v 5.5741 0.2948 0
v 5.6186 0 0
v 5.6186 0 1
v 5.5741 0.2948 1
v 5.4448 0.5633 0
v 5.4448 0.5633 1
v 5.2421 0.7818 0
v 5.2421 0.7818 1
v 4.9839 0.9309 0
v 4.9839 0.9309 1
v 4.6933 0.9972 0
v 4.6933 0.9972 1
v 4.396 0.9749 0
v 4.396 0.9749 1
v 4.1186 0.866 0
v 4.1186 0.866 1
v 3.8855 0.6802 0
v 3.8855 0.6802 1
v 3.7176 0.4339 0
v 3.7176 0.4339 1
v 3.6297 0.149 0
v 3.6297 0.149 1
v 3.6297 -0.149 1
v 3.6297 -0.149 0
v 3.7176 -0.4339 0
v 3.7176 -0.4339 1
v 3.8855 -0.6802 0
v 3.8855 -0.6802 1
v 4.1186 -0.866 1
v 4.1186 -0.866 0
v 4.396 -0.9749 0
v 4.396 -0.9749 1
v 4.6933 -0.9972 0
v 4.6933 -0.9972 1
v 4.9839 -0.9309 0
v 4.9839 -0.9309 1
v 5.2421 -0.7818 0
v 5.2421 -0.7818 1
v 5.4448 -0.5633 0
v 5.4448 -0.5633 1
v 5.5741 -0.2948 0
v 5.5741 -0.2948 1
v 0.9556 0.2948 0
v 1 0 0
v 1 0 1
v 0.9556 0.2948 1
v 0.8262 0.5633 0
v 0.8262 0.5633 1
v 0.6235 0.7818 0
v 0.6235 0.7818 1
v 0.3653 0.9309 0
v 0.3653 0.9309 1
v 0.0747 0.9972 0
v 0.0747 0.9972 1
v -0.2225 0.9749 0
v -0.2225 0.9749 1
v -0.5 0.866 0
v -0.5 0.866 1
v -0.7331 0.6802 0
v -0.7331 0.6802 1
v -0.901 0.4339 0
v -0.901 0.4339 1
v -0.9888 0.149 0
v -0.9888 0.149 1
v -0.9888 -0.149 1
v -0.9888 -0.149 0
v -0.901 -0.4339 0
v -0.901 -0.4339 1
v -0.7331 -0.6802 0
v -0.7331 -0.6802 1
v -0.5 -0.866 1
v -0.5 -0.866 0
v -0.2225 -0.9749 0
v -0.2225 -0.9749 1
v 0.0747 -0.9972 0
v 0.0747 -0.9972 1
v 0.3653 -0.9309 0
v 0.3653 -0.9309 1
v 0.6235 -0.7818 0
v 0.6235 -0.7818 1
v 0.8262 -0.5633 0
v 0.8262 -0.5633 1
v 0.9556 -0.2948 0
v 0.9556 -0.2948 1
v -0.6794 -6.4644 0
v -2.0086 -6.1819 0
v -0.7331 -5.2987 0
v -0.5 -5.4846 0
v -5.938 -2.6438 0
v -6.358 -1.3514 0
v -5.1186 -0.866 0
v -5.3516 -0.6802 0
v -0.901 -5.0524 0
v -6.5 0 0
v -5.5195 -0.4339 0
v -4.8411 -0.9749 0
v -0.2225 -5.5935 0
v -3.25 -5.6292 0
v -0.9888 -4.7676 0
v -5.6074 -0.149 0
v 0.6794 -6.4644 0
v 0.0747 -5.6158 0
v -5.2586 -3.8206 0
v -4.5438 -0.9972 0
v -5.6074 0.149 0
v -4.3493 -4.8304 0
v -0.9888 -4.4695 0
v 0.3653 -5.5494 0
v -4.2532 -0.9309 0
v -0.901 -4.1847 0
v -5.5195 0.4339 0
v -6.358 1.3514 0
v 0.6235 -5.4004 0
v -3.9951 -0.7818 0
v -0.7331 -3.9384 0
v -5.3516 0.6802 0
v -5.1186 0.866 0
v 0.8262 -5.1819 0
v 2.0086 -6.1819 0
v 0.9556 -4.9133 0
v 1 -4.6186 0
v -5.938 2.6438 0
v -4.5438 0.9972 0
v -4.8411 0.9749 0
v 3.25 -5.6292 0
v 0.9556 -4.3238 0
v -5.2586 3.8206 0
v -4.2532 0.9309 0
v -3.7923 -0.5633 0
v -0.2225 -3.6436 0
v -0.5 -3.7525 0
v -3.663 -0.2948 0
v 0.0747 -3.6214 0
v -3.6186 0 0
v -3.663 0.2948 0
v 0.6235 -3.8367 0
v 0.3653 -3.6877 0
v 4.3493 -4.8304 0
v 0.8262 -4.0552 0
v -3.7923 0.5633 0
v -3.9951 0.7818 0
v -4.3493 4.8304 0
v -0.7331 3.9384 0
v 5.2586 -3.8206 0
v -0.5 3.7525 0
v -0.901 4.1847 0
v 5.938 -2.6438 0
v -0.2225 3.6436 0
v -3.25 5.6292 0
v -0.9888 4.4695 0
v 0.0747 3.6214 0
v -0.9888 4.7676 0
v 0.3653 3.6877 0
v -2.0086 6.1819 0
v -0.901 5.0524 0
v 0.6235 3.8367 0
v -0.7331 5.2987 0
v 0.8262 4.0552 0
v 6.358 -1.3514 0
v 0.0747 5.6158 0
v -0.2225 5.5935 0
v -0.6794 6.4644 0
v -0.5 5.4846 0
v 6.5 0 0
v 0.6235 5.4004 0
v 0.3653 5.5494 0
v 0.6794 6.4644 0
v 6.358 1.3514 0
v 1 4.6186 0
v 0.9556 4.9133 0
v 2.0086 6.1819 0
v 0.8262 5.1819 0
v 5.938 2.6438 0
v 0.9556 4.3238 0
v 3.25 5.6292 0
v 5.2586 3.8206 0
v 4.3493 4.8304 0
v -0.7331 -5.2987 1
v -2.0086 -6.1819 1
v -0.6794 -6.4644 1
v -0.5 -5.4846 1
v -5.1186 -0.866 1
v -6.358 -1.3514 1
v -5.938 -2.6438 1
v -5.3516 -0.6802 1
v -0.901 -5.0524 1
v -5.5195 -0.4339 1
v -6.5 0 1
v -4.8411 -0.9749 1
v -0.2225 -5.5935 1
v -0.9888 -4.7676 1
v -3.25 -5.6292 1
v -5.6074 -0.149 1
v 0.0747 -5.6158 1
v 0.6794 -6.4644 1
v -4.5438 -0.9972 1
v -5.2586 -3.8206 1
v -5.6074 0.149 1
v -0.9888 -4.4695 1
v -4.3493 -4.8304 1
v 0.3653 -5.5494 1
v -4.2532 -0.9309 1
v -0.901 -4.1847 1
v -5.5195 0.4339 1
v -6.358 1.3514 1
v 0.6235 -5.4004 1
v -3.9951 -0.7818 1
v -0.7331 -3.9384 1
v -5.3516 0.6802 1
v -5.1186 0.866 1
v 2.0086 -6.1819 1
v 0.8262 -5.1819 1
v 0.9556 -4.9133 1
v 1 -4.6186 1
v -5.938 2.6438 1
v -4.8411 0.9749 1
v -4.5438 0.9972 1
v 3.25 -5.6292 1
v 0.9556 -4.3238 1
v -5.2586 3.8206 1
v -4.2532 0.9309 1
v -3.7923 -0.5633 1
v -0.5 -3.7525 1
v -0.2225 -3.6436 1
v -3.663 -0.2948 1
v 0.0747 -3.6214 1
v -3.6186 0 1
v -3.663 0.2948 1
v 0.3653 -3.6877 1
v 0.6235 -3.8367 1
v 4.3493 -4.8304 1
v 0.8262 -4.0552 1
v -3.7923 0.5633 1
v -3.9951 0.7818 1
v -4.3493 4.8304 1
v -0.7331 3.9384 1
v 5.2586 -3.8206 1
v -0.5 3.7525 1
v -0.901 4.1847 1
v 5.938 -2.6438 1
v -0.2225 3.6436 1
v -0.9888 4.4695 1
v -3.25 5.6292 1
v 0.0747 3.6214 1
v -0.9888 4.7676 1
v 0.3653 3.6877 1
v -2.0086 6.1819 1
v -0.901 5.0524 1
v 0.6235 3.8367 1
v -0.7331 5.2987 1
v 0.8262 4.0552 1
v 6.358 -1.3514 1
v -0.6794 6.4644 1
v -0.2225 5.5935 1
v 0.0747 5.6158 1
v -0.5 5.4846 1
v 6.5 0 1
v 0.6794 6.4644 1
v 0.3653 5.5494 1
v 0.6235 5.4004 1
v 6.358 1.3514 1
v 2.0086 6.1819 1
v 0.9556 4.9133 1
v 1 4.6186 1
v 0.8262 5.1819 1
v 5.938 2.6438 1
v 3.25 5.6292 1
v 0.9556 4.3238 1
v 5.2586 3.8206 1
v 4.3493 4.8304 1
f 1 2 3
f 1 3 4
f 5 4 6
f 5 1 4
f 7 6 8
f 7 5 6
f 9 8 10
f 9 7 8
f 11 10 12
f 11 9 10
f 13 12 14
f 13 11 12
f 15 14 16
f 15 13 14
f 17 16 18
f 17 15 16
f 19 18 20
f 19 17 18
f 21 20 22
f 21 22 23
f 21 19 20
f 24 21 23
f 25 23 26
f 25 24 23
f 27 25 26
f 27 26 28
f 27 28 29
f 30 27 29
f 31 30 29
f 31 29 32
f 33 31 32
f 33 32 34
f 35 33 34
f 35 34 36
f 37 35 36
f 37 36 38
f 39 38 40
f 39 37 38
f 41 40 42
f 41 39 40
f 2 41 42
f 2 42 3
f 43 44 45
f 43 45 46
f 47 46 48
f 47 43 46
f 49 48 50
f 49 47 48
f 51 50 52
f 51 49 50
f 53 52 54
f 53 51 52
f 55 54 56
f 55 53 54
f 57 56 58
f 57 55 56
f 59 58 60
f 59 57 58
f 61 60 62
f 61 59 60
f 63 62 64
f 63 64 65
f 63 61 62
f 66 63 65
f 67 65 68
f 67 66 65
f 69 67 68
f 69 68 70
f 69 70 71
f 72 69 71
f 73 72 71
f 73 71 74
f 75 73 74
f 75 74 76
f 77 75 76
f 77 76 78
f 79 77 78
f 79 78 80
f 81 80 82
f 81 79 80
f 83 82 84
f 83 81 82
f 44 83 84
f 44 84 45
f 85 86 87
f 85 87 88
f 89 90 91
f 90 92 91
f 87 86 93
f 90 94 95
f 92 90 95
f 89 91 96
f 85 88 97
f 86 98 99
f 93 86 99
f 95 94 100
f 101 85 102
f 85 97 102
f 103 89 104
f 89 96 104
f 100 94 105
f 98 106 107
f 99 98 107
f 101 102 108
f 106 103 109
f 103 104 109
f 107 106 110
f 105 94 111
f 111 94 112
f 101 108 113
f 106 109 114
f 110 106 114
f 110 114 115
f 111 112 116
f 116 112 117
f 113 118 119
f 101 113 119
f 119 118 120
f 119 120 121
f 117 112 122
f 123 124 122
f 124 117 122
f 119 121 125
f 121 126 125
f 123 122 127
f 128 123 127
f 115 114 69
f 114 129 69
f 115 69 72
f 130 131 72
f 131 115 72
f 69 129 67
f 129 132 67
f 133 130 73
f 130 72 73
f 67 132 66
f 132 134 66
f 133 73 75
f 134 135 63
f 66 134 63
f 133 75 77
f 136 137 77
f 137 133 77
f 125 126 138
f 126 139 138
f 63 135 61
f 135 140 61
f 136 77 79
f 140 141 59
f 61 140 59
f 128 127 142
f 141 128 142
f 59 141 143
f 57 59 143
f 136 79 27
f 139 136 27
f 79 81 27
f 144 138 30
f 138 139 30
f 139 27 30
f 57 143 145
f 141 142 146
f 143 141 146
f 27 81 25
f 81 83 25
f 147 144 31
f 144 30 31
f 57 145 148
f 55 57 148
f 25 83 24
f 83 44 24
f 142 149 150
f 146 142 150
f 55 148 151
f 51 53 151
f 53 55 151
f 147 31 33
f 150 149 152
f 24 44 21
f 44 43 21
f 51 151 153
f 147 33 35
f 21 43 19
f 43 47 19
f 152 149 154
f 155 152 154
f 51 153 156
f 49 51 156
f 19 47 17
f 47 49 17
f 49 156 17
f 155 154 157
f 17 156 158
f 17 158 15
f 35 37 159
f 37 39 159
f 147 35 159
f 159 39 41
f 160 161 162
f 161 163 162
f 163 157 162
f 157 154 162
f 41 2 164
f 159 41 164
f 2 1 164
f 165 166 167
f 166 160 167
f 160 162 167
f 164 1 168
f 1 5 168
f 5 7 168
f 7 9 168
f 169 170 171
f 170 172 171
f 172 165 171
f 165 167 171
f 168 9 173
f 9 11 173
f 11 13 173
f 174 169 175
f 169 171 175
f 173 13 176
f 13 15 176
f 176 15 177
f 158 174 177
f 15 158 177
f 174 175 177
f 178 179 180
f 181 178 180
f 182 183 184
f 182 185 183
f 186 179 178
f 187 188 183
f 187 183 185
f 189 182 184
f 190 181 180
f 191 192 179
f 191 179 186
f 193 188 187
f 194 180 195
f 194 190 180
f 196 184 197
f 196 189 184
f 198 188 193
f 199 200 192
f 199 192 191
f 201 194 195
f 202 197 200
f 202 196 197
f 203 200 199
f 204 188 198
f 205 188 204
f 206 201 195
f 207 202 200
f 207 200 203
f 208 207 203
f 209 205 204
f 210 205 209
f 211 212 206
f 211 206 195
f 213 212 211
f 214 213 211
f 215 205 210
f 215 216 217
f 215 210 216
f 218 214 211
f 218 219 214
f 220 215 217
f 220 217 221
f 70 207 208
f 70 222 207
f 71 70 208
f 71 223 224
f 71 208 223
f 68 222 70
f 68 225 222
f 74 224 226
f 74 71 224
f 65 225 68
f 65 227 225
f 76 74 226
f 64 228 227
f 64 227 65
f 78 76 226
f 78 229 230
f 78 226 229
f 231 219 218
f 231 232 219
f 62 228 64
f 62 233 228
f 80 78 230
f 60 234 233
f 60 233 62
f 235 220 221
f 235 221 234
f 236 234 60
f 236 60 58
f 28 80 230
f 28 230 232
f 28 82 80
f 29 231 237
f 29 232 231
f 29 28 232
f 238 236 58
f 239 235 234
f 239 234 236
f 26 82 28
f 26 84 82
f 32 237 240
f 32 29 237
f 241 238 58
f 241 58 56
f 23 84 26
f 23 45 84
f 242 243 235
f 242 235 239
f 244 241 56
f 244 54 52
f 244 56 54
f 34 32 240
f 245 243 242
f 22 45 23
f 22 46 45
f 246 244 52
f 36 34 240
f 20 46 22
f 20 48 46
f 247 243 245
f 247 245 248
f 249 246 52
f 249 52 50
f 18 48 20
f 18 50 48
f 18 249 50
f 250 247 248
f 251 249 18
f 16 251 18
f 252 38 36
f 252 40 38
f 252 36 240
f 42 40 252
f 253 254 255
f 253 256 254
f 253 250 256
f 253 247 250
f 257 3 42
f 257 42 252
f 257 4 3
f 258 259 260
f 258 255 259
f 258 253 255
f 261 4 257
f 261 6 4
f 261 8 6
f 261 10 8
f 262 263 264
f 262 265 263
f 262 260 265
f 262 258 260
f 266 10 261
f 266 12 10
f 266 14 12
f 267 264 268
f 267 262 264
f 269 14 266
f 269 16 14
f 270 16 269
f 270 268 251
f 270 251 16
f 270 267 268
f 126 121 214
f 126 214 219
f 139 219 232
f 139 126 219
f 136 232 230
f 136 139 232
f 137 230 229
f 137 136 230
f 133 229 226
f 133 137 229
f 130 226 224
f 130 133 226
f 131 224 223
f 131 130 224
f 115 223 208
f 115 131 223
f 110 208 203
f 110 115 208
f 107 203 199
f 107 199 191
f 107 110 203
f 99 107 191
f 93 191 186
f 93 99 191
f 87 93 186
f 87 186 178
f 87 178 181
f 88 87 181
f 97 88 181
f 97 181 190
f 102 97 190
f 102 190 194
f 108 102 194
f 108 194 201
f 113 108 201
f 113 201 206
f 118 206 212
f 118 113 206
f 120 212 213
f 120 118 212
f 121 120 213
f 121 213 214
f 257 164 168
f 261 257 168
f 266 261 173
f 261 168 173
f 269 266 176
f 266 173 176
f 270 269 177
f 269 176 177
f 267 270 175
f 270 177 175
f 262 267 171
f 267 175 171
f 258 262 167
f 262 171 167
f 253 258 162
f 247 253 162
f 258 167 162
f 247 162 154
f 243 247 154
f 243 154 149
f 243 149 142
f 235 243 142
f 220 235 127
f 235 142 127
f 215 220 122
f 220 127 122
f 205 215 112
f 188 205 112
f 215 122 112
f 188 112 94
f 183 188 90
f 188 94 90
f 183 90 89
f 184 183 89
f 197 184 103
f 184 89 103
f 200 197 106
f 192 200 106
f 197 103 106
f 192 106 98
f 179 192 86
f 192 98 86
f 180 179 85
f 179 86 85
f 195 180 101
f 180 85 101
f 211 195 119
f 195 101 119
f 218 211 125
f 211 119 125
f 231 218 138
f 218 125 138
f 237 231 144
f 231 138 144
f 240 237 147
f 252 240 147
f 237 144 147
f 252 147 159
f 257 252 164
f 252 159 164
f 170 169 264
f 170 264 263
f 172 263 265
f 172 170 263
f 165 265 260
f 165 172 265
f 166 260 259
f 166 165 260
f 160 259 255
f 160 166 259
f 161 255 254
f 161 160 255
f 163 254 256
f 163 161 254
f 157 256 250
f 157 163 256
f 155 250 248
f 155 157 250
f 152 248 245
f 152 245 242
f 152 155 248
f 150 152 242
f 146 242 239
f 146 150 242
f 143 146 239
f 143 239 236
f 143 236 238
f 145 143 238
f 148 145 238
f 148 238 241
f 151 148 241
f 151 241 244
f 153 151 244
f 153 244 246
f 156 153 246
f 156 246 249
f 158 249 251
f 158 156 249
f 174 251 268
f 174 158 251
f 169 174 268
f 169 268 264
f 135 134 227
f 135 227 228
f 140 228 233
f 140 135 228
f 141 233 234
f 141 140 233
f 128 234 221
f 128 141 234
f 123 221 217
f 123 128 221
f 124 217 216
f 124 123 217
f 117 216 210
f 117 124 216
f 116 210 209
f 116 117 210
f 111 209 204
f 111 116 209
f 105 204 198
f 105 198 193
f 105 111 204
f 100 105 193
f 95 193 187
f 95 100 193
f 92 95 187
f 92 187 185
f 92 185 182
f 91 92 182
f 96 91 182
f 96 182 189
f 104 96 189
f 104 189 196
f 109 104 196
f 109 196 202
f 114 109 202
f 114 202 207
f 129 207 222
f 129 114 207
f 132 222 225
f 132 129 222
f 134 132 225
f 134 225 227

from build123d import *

# Parameters (mm, degrees)
F0_R     = 6.5
F0_R_2   = 1
F1_DEPTH = 1


with BuildPart() as f1:
    # F0 (on Top) → F1 (new body)
    with BuildSketch(Plane.XY):
        Circle(F0_R)
        with Locations((0, -4.618563)):
            Circle(F0_R_2, mode=Mode.SUBTRACT)
        with Locations((-4.618563, 0)):
            Circle(F0_R_2, mode=Mode.SUBTRACT)
        Circle(F0_R_2, mode=Mode.SUBTRACT)
        with Locations((4.618563, 0)):
            Circle(F0_R_2, mode=Mode.SUBTRACT)
        with Locations((0, 4.618563)):
            Circle(F0_R_2, mode=Mode.SUBTRACT)
    extrude(amount=F1_DEPTH)


solid = f1.part
